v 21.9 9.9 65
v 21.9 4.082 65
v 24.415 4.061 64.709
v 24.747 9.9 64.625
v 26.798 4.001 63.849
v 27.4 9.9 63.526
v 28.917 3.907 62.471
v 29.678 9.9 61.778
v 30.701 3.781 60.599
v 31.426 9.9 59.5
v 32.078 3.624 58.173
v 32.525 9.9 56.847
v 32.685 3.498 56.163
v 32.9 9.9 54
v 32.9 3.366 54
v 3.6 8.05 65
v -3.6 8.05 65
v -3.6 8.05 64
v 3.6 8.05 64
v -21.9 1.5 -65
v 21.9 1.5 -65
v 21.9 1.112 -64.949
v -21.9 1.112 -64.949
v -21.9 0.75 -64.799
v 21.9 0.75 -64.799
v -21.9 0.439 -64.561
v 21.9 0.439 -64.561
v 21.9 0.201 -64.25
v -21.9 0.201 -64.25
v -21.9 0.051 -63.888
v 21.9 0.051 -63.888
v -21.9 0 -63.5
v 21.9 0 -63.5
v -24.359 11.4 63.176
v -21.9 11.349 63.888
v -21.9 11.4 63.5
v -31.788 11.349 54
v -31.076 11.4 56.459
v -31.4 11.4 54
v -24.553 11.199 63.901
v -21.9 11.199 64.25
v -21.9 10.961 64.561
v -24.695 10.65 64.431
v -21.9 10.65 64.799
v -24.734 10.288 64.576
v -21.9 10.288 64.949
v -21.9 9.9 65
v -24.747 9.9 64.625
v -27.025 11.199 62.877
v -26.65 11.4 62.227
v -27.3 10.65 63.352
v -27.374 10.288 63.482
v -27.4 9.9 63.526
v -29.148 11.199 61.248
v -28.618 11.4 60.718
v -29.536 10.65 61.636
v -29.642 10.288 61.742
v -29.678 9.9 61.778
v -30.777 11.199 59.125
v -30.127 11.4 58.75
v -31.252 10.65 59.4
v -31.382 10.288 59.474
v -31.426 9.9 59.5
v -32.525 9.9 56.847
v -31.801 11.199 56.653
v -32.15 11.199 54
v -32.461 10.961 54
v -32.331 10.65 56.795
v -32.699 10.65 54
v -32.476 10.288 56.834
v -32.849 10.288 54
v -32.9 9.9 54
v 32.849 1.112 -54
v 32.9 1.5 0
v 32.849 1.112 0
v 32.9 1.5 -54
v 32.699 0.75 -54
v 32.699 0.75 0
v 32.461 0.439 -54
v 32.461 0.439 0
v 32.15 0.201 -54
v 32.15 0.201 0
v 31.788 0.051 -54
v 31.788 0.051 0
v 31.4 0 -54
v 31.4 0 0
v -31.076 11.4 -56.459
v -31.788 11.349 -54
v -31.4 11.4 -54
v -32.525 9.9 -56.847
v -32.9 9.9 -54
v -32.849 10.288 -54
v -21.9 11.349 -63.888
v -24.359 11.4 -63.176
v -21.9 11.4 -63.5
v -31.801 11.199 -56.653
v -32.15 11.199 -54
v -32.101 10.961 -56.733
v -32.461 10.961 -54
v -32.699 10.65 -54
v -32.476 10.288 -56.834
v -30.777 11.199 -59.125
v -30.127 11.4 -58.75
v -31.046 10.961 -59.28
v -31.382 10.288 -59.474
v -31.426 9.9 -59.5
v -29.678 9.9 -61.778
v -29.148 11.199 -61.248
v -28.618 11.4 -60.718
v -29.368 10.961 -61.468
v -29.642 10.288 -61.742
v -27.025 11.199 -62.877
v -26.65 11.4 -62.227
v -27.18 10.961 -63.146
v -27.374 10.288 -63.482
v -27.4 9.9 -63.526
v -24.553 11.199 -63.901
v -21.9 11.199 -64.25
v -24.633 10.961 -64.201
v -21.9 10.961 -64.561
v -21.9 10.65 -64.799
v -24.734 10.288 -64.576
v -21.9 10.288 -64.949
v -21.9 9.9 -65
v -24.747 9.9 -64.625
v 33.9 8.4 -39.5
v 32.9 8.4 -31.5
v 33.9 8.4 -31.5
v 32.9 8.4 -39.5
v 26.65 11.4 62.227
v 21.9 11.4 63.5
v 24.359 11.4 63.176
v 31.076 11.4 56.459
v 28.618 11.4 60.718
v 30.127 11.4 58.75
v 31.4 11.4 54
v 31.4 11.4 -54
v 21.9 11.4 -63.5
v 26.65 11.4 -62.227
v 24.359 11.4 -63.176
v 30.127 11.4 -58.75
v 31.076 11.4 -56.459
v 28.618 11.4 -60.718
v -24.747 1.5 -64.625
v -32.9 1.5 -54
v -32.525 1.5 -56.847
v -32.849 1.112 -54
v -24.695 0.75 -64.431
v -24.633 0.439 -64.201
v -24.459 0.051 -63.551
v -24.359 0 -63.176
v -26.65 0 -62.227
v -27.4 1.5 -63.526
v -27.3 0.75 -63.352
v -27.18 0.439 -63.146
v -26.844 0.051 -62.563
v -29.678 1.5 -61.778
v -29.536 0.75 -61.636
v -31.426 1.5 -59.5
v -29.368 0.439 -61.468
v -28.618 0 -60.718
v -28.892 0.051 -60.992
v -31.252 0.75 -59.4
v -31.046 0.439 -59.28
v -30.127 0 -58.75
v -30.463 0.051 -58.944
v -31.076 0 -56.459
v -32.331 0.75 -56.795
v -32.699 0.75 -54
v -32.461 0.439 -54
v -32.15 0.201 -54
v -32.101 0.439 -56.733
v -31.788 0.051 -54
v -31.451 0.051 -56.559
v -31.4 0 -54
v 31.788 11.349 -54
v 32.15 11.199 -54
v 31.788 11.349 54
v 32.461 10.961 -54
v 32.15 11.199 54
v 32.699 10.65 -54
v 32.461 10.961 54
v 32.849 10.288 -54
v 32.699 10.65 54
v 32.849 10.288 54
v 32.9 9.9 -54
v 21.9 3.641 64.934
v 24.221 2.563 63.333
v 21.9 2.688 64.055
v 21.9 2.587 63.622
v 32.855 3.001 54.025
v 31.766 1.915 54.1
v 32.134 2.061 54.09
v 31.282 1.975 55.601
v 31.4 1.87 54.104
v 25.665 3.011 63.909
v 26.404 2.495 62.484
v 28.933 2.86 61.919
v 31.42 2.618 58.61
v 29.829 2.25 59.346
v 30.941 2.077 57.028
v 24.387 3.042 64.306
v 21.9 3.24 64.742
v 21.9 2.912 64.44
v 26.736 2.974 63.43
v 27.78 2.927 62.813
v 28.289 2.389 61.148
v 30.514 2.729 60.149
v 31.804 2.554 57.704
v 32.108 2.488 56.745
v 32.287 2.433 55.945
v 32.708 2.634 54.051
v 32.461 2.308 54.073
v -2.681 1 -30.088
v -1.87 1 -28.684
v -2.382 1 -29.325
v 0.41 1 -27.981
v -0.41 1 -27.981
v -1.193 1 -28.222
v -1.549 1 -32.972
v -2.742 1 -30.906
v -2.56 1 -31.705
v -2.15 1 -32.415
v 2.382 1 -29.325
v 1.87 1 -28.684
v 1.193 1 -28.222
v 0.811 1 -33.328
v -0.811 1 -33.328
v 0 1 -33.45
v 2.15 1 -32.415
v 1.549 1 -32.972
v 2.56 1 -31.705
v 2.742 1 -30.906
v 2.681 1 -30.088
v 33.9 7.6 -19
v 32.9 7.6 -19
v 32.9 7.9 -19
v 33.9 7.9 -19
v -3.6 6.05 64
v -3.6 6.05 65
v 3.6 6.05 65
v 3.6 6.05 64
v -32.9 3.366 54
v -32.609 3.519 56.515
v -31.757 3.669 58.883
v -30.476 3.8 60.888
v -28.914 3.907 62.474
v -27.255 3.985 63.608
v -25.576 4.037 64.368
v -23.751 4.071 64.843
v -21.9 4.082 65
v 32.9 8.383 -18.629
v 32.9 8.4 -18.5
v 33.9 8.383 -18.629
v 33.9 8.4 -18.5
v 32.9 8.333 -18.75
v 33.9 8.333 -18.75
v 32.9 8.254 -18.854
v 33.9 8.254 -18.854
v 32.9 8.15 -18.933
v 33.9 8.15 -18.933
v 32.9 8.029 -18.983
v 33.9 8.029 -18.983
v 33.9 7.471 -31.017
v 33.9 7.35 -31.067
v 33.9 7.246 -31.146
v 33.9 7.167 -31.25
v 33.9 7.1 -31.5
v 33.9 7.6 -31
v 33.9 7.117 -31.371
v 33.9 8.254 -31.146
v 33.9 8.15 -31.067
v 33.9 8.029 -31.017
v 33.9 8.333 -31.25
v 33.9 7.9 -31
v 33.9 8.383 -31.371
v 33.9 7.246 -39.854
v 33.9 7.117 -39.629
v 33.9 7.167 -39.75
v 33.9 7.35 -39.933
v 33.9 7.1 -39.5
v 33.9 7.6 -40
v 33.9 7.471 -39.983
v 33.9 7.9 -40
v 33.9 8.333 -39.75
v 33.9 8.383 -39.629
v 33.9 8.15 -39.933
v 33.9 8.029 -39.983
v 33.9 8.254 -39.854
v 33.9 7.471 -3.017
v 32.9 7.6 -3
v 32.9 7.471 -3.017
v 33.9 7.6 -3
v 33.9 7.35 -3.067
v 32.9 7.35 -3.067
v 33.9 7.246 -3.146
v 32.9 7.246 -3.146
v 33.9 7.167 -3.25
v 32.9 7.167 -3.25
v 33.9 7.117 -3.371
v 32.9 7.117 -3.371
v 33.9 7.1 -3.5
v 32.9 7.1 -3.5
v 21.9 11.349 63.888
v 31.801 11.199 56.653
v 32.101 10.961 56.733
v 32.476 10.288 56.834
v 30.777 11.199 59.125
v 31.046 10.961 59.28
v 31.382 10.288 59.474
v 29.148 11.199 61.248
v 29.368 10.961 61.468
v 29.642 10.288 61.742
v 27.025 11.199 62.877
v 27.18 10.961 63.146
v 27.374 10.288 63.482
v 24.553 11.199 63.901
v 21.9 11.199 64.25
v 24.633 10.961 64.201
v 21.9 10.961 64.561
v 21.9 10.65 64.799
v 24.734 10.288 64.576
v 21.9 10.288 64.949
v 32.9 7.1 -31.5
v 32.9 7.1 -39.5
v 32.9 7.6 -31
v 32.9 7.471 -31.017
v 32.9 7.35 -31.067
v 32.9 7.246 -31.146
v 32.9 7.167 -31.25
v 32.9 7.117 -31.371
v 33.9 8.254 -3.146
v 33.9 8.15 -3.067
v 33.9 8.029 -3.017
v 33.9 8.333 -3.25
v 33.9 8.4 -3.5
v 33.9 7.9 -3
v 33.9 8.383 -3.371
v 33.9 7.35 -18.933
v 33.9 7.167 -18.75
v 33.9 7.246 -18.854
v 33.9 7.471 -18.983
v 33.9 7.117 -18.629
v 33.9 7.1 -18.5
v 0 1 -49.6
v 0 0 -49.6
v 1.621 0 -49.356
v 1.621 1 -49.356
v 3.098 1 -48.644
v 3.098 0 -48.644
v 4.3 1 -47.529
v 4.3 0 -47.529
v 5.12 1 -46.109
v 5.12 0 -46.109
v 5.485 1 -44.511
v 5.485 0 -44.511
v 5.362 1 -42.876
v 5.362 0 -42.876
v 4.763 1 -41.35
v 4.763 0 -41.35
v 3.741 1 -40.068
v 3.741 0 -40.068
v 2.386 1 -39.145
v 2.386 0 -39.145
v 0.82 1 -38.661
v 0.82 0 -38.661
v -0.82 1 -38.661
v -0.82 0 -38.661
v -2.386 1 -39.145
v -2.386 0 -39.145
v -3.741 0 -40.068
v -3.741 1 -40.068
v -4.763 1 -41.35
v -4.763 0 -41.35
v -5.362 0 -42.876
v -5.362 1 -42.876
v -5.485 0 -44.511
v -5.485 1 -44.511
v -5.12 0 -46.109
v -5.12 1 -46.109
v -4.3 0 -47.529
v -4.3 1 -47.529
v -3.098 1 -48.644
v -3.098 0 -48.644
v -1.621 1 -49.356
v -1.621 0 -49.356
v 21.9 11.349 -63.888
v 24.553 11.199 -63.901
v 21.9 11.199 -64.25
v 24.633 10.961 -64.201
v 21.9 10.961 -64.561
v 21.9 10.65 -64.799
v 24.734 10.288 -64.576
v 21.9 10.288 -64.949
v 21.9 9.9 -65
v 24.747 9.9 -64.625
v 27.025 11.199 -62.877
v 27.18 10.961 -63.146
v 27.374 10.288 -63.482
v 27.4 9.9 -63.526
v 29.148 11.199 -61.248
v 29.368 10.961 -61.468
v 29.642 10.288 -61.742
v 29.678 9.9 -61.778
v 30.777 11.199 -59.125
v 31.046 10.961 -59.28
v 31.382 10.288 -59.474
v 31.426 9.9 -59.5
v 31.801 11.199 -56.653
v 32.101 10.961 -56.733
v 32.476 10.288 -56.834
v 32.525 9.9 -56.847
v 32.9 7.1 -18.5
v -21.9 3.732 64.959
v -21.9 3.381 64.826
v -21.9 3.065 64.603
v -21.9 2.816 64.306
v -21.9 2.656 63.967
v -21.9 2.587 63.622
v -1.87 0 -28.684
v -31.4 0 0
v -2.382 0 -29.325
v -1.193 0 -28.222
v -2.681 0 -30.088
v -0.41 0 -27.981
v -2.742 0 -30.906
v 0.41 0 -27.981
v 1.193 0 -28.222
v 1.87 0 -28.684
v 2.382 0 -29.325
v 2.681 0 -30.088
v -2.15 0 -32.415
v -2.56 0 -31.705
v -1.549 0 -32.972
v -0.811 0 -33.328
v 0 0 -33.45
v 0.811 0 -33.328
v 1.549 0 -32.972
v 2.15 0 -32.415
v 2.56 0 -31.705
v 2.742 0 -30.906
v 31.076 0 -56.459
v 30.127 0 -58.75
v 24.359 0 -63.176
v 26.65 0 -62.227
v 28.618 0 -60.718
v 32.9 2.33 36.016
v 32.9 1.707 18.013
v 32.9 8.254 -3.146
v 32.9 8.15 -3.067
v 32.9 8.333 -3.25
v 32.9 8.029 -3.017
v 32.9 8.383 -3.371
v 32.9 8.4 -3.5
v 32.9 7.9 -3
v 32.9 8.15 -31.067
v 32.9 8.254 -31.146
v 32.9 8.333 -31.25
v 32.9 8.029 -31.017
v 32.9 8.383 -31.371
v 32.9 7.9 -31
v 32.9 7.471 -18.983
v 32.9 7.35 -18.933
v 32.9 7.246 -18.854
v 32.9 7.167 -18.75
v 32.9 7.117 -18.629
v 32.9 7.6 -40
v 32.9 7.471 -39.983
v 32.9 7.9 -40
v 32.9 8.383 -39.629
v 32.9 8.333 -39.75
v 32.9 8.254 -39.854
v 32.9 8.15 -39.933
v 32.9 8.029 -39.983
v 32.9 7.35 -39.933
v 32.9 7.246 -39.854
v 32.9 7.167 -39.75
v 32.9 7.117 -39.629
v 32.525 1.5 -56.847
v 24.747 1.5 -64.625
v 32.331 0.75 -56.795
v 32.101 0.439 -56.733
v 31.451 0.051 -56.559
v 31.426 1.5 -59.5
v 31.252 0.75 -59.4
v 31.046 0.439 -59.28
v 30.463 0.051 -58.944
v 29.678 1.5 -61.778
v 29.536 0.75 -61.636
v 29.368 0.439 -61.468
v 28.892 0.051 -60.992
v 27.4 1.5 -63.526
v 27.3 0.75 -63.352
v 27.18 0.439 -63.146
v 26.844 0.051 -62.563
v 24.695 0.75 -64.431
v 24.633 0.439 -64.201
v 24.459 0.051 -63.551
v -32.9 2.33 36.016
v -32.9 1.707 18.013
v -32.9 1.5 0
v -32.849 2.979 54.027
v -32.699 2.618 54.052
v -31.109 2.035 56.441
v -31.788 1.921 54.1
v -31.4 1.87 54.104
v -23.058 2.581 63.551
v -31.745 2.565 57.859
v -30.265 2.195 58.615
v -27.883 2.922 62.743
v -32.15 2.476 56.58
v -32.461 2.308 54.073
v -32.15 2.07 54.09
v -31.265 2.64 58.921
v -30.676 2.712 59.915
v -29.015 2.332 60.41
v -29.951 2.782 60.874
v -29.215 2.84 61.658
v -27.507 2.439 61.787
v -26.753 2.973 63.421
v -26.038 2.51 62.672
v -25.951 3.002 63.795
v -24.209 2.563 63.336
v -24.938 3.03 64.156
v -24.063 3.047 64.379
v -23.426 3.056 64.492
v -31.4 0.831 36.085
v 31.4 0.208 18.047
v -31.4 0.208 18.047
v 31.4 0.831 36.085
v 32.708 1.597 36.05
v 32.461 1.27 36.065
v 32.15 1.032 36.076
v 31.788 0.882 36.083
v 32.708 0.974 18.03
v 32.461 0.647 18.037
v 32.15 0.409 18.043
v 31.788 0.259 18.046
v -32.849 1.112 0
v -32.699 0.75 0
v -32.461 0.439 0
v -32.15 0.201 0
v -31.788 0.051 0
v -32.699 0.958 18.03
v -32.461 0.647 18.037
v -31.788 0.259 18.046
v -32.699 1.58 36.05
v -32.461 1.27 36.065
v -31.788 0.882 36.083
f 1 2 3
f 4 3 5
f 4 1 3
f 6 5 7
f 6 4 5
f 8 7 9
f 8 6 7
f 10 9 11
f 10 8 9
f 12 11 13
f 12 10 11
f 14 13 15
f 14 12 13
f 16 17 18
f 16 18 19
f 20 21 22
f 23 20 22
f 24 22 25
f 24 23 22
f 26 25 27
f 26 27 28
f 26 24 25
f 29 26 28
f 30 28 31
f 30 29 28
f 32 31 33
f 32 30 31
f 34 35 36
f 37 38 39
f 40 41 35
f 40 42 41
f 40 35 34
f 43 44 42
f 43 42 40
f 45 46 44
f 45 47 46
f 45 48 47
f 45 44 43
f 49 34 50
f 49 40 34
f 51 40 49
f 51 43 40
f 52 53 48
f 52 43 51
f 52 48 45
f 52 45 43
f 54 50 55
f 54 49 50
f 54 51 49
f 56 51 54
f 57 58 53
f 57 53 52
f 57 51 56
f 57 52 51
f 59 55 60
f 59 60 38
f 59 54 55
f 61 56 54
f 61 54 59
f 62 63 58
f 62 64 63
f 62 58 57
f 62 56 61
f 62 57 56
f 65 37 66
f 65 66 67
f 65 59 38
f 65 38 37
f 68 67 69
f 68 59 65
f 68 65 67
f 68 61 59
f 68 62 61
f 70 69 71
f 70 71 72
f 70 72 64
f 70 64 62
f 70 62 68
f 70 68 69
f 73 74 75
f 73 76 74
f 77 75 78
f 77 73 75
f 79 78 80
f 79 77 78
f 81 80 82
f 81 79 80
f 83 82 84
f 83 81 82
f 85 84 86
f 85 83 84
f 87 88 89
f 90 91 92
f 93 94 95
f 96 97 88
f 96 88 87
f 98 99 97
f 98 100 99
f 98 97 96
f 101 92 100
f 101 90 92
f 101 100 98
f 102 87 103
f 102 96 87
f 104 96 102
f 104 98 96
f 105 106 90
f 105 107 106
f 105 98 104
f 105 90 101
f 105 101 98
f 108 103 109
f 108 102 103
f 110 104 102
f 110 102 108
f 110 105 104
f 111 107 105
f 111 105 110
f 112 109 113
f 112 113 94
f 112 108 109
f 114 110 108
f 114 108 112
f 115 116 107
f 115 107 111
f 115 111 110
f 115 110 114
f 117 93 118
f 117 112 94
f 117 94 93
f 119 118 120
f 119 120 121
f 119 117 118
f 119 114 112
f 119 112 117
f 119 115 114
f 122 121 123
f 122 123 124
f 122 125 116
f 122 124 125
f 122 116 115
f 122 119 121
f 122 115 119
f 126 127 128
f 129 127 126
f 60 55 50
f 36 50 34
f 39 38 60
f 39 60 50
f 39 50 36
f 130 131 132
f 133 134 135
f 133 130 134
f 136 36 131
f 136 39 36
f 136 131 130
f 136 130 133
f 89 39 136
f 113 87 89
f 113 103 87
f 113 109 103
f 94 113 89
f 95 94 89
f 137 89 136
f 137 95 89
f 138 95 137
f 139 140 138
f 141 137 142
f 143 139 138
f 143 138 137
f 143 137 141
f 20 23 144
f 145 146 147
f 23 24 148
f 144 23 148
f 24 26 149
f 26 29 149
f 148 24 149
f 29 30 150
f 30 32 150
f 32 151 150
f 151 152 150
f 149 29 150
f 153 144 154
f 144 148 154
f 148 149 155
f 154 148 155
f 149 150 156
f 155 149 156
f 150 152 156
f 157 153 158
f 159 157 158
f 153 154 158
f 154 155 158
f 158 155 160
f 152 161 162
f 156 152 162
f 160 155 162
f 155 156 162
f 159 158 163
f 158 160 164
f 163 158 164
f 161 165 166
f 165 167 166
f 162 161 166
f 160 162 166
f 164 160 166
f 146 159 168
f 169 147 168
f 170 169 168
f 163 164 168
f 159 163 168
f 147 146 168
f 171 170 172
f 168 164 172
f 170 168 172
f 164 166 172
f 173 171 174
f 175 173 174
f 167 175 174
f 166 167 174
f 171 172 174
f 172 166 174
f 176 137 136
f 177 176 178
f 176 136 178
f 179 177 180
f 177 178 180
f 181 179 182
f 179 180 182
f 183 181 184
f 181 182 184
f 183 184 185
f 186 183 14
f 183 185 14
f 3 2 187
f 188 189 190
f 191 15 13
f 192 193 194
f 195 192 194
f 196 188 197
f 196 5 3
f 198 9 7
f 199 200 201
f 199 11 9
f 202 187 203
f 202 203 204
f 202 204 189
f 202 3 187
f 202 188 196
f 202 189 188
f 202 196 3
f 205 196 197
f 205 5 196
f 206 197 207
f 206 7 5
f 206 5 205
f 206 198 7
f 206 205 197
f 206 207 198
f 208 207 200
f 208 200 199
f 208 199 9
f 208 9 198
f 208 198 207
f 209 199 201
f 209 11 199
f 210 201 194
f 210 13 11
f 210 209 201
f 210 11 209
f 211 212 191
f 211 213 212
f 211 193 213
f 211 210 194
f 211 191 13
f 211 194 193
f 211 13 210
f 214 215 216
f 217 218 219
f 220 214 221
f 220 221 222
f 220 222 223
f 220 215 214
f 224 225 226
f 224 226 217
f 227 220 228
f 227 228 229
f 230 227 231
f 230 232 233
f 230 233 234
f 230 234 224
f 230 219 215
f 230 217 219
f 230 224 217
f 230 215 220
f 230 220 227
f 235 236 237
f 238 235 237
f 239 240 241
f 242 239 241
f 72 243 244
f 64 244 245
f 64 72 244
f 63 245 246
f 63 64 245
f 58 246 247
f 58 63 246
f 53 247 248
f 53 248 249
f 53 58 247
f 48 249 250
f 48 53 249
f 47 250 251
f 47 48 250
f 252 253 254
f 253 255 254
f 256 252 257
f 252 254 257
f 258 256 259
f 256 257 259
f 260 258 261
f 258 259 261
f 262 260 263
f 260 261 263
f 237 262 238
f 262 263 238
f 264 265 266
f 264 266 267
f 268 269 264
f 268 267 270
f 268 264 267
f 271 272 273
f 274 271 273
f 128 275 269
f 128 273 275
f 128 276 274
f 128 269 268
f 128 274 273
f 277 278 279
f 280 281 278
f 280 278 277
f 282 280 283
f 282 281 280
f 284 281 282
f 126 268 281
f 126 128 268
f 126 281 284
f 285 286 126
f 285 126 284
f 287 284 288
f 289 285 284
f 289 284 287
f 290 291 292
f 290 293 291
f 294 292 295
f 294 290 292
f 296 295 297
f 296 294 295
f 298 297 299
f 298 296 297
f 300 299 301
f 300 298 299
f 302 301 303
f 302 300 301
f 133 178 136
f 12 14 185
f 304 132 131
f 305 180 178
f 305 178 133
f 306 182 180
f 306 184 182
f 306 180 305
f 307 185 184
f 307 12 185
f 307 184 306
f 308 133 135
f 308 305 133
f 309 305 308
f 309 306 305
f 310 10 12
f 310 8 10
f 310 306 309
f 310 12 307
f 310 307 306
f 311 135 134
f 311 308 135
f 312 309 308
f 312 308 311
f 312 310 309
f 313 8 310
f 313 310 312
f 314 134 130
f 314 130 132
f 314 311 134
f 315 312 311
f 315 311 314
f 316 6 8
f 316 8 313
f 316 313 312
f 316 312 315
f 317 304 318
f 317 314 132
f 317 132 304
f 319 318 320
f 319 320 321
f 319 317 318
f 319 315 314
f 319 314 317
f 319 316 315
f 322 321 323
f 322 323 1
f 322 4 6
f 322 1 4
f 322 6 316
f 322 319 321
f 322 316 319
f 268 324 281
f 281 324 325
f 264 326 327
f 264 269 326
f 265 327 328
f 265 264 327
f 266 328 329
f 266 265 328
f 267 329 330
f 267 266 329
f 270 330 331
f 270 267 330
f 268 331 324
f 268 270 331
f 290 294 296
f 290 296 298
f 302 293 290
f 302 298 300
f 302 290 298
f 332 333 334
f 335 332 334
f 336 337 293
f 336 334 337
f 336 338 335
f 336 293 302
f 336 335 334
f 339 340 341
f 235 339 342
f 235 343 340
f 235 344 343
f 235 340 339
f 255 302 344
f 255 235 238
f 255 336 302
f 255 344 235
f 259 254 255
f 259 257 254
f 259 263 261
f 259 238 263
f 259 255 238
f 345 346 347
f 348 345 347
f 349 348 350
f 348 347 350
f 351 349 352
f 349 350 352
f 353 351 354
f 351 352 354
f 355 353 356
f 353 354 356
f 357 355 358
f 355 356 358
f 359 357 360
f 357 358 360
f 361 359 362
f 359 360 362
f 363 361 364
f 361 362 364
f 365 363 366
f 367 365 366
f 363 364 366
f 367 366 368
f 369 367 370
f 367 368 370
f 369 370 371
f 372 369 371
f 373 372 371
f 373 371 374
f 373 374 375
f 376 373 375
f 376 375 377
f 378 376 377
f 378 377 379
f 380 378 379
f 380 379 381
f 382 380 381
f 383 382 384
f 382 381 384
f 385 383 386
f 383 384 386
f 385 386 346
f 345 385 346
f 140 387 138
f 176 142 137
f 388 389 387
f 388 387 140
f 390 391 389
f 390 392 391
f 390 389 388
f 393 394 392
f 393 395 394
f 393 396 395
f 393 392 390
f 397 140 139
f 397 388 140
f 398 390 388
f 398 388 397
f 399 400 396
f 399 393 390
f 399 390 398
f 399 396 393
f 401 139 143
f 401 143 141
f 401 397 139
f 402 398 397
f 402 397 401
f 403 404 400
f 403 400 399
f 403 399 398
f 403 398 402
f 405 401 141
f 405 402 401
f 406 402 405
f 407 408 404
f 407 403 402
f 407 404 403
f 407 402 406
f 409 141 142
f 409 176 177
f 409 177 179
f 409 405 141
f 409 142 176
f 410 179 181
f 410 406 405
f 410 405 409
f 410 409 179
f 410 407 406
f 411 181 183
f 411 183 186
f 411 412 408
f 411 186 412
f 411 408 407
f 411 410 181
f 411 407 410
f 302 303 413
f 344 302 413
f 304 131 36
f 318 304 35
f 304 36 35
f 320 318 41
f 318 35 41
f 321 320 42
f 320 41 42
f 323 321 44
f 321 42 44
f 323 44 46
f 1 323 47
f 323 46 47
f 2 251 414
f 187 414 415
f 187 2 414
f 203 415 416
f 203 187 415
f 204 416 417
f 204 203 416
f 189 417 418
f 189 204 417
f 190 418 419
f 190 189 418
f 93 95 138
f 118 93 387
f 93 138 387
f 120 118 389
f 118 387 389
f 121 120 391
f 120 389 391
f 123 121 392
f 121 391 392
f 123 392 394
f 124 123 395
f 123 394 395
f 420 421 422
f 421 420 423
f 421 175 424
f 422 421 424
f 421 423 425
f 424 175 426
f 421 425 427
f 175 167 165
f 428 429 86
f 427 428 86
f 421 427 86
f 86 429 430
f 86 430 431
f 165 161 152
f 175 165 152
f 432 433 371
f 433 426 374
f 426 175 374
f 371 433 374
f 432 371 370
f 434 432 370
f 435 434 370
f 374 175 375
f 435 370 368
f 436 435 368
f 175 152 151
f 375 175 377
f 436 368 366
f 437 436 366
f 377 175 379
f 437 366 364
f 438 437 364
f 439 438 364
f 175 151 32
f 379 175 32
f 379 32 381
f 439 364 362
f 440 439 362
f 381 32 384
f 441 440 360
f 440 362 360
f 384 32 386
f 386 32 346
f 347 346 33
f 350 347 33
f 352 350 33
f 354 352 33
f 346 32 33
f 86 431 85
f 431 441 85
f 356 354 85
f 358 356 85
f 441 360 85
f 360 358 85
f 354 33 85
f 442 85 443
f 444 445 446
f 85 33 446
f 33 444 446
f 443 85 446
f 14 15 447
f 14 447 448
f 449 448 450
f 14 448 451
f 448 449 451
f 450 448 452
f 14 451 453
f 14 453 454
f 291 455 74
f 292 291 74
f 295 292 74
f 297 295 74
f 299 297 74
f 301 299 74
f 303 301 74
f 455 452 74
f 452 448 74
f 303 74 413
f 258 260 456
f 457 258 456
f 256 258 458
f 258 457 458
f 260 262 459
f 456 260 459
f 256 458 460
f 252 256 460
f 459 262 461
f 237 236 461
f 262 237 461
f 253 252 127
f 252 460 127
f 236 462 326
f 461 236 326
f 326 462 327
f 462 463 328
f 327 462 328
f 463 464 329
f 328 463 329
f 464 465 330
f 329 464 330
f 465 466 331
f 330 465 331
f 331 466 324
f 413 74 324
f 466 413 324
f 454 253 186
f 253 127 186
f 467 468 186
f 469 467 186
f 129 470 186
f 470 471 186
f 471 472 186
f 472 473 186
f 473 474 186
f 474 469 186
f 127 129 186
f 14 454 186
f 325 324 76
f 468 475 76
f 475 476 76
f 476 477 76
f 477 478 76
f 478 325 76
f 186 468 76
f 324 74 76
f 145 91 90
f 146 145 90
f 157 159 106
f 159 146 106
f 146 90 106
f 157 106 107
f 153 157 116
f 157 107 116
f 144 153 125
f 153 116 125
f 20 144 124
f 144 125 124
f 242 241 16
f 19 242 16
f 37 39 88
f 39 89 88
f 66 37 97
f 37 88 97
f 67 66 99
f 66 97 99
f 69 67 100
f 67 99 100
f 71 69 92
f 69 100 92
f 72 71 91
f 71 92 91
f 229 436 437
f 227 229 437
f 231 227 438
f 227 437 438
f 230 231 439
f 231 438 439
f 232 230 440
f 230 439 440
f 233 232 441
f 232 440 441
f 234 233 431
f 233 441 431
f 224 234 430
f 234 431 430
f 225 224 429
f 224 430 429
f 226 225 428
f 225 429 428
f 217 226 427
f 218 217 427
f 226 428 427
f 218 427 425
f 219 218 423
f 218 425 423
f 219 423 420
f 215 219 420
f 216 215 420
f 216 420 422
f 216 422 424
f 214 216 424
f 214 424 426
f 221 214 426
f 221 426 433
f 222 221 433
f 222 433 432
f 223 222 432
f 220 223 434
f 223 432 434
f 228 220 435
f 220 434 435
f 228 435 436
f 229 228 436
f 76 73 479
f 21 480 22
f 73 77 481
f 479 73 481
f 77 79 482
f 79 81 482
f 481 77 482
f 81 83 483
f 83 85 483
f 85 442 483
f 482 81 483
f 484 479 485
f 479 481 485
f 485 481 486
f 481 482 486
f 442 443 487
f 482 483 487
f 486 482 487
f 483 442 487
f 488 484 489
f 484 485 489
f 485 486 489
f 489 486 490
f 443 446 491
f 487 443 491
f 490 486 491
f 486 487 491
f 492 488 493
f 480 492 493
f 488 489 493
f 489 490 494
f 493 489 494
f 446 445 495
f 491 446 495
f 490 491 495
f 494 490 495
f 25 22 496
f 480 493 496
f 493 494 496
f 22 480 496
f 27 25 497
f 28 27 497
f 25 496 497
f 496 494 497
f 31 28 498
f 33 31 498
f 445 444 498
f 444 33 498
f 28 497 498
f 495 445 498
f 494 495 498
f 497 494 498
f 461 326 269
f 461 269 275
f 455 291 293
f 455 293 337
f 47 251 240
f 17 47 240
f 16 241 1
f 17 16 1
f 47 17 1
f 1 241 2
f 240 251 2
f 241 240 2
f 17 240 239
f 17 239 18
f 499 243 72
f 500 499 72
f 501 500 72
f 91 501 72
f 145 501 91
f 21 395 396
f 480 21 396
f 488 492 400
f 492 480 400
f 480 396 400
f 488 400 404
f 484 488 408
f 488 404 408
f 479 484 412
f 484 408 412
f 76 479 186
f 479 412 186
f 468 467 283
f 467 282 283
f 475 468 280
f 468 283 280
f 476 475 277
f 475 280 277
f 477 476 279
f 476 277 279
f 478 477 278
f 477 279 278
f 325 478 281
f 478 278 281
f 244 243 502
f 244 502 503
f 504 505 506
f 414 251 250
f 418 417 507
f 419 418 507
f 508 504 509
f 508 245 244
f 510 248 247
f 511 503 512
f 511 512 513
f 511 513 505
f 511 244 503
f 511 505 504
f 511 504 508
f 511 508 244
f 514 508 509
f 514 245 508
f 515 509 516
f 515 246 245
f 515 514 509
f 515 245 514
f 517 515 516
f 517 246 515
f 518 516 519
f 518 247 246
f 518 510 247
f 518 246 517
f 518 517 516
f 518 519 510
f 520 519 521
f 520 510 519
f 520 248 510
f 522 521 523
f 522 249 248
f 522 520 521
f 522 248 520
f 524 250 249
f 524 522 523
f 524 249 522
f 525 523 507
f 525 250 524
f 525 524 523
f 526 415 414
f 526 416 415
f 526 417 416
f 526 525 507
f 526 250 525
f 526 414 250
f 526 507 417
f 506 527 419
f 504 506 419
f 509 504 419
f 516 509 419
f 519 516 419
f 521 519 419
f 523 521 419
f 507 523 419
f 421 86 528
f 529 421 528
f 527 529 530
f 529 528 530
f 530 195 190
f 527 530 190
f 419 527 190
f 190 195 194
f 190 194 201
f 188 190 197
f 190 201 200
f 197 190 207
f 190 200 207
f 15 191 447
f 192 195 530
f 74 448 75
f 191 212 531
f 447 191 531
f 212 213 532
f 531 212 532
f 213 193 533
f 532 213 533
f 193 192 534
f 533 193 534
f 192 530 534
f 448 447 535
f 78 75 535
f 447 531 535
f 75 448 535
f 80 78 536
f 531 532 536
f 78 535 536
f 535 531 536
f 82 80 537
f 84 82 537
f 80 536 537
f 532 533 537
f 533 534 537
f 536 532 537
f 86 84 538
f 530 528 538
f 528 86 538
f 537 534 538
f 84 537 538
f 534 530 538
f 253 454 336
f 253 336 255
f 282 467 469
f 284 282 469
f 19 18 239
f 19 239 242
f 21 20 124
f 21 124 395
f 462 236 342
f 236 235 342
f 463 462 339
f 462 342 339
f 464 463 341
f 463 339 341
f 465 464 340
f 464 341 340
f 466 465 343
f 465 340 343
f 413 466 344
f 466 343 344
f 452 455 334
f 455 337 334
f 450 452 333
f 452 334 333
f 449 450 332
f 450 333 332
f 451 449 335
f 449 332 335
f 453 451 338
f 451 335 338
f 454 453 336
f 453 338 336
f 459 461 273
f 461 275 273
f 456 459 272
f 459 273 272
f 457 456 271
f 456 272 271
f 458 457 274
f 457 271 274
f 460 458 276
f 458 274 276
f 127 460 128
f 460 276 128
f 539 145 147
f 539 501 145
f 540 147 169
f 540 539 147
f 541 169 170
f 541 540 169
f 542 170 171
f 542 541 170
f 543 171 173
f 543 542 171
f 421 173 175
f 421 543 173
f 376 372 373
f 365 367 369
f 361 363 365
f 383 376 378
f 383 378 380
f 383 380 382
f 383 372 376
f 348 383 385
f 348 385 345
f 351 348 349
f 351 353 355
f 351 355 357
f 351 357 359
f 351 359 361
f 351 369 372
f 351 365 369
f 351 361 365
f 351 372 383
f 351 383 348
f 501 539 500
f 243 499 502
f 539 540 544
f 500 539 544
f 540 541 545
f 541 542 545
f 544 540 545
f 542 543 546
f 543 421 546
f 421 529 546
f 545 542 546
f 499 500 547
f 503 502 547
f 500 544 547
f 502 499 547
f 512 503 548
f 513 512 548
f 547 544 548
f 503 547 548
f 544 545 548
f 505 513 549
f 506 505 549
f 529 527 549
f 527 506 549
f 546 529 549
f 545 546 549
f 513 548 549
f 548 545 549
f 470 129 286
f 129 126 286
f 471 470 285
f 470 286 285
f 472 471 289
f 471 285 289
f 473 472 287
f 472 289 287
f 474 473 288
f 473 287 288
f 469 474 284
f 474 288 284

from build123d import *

# Parameters (mm, degrees)
SKETCH1_W           = 65.8
SKETCH1_H           = 130
BOSS_EXTRUDE1_DEPTH = 11.4
CUT_EXTRUDE1_DEPTH  = 94.191201301
FILLET1_R           = 11
SKETCH3_R           = 5.5
SKETCH3_R_2         = 2.75
CUT_EXTRUDE2_DEPTH  = 1
SKETCH4_W           = 16
SKETCH4_H           = 1.3
SKETCH4_W_2         = 9
BOSS_EXTRUDE2_DEPTH = 1
SKETCH5_W           = 7.2
SKETCH5_H           = 2
CUT_EXTRUDE3_DEPTH  = 1
FILLET2_R           = 0.5
FILLET3_R           = 1.5


with BuildPart() as part:
    # Sketch1 → Boss-Extrude1 (new body)
    with BuildSketch(Plane(origin=(0, 0, 0), x_dir=(1, 0, 0), z_dir=(0, 1, 0))):
        Rectangle(SKETCH1_W, SKETCH1_H)
    extrude(amount=BOSS_EXTRUDE1_DEPTH)

    # Sketch2 → Cut-Extrude1 (cut, through all)
    with BuildSketch(Plane(origin=(32.9, 0, 0), x_dir=(0, 0, -1), z_dir=(1, 0, 0))):
        with BuildLine():
            Line((-65, 2.7), (-65, 0))
            Line((-65, 0), (0, 0))
            ThreePointArc((0, 0), (-32.528026377, 0.675290918), (-65, 2.7))
        make_face()
    extrude(amount=-CUT_EXTRUDE1_DEPTH, mode=Mode.SUBTRACT)

    # Fillet1
    fillet1_edges = [part.edges().sort_by_distance(p)[0] for p in [
        (32.9, 7.05, 65),
        (-32.9, 7.05, 65),
        (-32.9, 5.7, -65),
        (32.9, 5.7, -65),
    ]]
    fillet(fillet1_edges, radius=FILLET1_R)

    # Sketch3 → Cut-Extrude2 (cut)
    with BuildSketch(Plane.XZ):
        with Locations(Location((0, -44.1, 0), (0, 0, 270))):
            Circle(SKETCH3_R)
        with Locations(Location((0, -30.7, 0), (0, 0, 270))):
            Circle(SKETCH3_R_2)
    extrude(amount=-CUT_EXTRUDE2_DEPTH, mode=Mode.SUBTRACT)

    # Sketch4 → Boss-Extrude2 (add)
    with BuildSketch(Plane(origin=(32.9, 0, 0), x_dir=(0, 0, -1), z_dir=(1, 0, 0))):
        with Locations((11, 7.75)):
            Rectangle(SKETCH4_W, SKETCH4_H)
        with Locations((35.5, 7.75)):
            Rectangle(SKETCH4_W_2, SKETCH4_H)
    extrude(amount=BOSS_EXTRUDE2_DEPTH)

    # Sketch5 → Cut-Extrude3 (cut)
    with BuildSketch(Plane.XY.offset(65)):
        with Locations((0, 7.05)):
            Rectangle(SKETCH5_W, SKETCH5_H)
    extrude(amount=-CUT_EXTRUDE3_DEPTH, mode=Mode.SUBTRACT)

    # Fillet2
    fillet2_edges = [part.edges().sort_by_distance(p)[0] for p in [
        (33.4, 7.1, -19),
        (33.4, 8.4, -19),
        (33.4, 8.4, -3),
        (33.4, 7.1, -3),
        (33.4, 7.1, -40),
        (33.4, 8.4, -40),
        (33.4, 8.4, -31),
        (33.4, 7.1, -31),
    ]]
    fillet(fillet2_edges, radius=FILLET2_R)

    # Fillet3
    fillet3_edges = [part.edges().sort_by_distance(p)[0] for p in [
        (32.9, 0, -27),
        (-32.9, 0.465759006, 27.016054675),
        (32.9, 0.465759006, 27.016054675),
        (-32.9, 0, -27),
        (-32.9, 11.4, 0),
        (0, 0, -65),
        (29.678174593, 0, -61.778174593),
        (-29.678174593, 0, -61.778174593),
        (0, 11.4, -65),
        (32.9, 11.4, 0),
        (0, 11.4, 65),
        (-29.678174593, 11.4, 61.778174593),
        (29.678174593, 11.4, 61.778174593),
        (29.678174593, 11.4, -61.778174593),
        (-29.678174593, 11.4, -61.778174593),
        (0, 2.7, 65),
        (-29.683166447, 2.438171783, 61.773179536),
        (29.683166447, 2.438171783, 61.773179536),
    ]]
    fillet(fillet3_edges, radius=FILLET3_R)


solid = part.part
